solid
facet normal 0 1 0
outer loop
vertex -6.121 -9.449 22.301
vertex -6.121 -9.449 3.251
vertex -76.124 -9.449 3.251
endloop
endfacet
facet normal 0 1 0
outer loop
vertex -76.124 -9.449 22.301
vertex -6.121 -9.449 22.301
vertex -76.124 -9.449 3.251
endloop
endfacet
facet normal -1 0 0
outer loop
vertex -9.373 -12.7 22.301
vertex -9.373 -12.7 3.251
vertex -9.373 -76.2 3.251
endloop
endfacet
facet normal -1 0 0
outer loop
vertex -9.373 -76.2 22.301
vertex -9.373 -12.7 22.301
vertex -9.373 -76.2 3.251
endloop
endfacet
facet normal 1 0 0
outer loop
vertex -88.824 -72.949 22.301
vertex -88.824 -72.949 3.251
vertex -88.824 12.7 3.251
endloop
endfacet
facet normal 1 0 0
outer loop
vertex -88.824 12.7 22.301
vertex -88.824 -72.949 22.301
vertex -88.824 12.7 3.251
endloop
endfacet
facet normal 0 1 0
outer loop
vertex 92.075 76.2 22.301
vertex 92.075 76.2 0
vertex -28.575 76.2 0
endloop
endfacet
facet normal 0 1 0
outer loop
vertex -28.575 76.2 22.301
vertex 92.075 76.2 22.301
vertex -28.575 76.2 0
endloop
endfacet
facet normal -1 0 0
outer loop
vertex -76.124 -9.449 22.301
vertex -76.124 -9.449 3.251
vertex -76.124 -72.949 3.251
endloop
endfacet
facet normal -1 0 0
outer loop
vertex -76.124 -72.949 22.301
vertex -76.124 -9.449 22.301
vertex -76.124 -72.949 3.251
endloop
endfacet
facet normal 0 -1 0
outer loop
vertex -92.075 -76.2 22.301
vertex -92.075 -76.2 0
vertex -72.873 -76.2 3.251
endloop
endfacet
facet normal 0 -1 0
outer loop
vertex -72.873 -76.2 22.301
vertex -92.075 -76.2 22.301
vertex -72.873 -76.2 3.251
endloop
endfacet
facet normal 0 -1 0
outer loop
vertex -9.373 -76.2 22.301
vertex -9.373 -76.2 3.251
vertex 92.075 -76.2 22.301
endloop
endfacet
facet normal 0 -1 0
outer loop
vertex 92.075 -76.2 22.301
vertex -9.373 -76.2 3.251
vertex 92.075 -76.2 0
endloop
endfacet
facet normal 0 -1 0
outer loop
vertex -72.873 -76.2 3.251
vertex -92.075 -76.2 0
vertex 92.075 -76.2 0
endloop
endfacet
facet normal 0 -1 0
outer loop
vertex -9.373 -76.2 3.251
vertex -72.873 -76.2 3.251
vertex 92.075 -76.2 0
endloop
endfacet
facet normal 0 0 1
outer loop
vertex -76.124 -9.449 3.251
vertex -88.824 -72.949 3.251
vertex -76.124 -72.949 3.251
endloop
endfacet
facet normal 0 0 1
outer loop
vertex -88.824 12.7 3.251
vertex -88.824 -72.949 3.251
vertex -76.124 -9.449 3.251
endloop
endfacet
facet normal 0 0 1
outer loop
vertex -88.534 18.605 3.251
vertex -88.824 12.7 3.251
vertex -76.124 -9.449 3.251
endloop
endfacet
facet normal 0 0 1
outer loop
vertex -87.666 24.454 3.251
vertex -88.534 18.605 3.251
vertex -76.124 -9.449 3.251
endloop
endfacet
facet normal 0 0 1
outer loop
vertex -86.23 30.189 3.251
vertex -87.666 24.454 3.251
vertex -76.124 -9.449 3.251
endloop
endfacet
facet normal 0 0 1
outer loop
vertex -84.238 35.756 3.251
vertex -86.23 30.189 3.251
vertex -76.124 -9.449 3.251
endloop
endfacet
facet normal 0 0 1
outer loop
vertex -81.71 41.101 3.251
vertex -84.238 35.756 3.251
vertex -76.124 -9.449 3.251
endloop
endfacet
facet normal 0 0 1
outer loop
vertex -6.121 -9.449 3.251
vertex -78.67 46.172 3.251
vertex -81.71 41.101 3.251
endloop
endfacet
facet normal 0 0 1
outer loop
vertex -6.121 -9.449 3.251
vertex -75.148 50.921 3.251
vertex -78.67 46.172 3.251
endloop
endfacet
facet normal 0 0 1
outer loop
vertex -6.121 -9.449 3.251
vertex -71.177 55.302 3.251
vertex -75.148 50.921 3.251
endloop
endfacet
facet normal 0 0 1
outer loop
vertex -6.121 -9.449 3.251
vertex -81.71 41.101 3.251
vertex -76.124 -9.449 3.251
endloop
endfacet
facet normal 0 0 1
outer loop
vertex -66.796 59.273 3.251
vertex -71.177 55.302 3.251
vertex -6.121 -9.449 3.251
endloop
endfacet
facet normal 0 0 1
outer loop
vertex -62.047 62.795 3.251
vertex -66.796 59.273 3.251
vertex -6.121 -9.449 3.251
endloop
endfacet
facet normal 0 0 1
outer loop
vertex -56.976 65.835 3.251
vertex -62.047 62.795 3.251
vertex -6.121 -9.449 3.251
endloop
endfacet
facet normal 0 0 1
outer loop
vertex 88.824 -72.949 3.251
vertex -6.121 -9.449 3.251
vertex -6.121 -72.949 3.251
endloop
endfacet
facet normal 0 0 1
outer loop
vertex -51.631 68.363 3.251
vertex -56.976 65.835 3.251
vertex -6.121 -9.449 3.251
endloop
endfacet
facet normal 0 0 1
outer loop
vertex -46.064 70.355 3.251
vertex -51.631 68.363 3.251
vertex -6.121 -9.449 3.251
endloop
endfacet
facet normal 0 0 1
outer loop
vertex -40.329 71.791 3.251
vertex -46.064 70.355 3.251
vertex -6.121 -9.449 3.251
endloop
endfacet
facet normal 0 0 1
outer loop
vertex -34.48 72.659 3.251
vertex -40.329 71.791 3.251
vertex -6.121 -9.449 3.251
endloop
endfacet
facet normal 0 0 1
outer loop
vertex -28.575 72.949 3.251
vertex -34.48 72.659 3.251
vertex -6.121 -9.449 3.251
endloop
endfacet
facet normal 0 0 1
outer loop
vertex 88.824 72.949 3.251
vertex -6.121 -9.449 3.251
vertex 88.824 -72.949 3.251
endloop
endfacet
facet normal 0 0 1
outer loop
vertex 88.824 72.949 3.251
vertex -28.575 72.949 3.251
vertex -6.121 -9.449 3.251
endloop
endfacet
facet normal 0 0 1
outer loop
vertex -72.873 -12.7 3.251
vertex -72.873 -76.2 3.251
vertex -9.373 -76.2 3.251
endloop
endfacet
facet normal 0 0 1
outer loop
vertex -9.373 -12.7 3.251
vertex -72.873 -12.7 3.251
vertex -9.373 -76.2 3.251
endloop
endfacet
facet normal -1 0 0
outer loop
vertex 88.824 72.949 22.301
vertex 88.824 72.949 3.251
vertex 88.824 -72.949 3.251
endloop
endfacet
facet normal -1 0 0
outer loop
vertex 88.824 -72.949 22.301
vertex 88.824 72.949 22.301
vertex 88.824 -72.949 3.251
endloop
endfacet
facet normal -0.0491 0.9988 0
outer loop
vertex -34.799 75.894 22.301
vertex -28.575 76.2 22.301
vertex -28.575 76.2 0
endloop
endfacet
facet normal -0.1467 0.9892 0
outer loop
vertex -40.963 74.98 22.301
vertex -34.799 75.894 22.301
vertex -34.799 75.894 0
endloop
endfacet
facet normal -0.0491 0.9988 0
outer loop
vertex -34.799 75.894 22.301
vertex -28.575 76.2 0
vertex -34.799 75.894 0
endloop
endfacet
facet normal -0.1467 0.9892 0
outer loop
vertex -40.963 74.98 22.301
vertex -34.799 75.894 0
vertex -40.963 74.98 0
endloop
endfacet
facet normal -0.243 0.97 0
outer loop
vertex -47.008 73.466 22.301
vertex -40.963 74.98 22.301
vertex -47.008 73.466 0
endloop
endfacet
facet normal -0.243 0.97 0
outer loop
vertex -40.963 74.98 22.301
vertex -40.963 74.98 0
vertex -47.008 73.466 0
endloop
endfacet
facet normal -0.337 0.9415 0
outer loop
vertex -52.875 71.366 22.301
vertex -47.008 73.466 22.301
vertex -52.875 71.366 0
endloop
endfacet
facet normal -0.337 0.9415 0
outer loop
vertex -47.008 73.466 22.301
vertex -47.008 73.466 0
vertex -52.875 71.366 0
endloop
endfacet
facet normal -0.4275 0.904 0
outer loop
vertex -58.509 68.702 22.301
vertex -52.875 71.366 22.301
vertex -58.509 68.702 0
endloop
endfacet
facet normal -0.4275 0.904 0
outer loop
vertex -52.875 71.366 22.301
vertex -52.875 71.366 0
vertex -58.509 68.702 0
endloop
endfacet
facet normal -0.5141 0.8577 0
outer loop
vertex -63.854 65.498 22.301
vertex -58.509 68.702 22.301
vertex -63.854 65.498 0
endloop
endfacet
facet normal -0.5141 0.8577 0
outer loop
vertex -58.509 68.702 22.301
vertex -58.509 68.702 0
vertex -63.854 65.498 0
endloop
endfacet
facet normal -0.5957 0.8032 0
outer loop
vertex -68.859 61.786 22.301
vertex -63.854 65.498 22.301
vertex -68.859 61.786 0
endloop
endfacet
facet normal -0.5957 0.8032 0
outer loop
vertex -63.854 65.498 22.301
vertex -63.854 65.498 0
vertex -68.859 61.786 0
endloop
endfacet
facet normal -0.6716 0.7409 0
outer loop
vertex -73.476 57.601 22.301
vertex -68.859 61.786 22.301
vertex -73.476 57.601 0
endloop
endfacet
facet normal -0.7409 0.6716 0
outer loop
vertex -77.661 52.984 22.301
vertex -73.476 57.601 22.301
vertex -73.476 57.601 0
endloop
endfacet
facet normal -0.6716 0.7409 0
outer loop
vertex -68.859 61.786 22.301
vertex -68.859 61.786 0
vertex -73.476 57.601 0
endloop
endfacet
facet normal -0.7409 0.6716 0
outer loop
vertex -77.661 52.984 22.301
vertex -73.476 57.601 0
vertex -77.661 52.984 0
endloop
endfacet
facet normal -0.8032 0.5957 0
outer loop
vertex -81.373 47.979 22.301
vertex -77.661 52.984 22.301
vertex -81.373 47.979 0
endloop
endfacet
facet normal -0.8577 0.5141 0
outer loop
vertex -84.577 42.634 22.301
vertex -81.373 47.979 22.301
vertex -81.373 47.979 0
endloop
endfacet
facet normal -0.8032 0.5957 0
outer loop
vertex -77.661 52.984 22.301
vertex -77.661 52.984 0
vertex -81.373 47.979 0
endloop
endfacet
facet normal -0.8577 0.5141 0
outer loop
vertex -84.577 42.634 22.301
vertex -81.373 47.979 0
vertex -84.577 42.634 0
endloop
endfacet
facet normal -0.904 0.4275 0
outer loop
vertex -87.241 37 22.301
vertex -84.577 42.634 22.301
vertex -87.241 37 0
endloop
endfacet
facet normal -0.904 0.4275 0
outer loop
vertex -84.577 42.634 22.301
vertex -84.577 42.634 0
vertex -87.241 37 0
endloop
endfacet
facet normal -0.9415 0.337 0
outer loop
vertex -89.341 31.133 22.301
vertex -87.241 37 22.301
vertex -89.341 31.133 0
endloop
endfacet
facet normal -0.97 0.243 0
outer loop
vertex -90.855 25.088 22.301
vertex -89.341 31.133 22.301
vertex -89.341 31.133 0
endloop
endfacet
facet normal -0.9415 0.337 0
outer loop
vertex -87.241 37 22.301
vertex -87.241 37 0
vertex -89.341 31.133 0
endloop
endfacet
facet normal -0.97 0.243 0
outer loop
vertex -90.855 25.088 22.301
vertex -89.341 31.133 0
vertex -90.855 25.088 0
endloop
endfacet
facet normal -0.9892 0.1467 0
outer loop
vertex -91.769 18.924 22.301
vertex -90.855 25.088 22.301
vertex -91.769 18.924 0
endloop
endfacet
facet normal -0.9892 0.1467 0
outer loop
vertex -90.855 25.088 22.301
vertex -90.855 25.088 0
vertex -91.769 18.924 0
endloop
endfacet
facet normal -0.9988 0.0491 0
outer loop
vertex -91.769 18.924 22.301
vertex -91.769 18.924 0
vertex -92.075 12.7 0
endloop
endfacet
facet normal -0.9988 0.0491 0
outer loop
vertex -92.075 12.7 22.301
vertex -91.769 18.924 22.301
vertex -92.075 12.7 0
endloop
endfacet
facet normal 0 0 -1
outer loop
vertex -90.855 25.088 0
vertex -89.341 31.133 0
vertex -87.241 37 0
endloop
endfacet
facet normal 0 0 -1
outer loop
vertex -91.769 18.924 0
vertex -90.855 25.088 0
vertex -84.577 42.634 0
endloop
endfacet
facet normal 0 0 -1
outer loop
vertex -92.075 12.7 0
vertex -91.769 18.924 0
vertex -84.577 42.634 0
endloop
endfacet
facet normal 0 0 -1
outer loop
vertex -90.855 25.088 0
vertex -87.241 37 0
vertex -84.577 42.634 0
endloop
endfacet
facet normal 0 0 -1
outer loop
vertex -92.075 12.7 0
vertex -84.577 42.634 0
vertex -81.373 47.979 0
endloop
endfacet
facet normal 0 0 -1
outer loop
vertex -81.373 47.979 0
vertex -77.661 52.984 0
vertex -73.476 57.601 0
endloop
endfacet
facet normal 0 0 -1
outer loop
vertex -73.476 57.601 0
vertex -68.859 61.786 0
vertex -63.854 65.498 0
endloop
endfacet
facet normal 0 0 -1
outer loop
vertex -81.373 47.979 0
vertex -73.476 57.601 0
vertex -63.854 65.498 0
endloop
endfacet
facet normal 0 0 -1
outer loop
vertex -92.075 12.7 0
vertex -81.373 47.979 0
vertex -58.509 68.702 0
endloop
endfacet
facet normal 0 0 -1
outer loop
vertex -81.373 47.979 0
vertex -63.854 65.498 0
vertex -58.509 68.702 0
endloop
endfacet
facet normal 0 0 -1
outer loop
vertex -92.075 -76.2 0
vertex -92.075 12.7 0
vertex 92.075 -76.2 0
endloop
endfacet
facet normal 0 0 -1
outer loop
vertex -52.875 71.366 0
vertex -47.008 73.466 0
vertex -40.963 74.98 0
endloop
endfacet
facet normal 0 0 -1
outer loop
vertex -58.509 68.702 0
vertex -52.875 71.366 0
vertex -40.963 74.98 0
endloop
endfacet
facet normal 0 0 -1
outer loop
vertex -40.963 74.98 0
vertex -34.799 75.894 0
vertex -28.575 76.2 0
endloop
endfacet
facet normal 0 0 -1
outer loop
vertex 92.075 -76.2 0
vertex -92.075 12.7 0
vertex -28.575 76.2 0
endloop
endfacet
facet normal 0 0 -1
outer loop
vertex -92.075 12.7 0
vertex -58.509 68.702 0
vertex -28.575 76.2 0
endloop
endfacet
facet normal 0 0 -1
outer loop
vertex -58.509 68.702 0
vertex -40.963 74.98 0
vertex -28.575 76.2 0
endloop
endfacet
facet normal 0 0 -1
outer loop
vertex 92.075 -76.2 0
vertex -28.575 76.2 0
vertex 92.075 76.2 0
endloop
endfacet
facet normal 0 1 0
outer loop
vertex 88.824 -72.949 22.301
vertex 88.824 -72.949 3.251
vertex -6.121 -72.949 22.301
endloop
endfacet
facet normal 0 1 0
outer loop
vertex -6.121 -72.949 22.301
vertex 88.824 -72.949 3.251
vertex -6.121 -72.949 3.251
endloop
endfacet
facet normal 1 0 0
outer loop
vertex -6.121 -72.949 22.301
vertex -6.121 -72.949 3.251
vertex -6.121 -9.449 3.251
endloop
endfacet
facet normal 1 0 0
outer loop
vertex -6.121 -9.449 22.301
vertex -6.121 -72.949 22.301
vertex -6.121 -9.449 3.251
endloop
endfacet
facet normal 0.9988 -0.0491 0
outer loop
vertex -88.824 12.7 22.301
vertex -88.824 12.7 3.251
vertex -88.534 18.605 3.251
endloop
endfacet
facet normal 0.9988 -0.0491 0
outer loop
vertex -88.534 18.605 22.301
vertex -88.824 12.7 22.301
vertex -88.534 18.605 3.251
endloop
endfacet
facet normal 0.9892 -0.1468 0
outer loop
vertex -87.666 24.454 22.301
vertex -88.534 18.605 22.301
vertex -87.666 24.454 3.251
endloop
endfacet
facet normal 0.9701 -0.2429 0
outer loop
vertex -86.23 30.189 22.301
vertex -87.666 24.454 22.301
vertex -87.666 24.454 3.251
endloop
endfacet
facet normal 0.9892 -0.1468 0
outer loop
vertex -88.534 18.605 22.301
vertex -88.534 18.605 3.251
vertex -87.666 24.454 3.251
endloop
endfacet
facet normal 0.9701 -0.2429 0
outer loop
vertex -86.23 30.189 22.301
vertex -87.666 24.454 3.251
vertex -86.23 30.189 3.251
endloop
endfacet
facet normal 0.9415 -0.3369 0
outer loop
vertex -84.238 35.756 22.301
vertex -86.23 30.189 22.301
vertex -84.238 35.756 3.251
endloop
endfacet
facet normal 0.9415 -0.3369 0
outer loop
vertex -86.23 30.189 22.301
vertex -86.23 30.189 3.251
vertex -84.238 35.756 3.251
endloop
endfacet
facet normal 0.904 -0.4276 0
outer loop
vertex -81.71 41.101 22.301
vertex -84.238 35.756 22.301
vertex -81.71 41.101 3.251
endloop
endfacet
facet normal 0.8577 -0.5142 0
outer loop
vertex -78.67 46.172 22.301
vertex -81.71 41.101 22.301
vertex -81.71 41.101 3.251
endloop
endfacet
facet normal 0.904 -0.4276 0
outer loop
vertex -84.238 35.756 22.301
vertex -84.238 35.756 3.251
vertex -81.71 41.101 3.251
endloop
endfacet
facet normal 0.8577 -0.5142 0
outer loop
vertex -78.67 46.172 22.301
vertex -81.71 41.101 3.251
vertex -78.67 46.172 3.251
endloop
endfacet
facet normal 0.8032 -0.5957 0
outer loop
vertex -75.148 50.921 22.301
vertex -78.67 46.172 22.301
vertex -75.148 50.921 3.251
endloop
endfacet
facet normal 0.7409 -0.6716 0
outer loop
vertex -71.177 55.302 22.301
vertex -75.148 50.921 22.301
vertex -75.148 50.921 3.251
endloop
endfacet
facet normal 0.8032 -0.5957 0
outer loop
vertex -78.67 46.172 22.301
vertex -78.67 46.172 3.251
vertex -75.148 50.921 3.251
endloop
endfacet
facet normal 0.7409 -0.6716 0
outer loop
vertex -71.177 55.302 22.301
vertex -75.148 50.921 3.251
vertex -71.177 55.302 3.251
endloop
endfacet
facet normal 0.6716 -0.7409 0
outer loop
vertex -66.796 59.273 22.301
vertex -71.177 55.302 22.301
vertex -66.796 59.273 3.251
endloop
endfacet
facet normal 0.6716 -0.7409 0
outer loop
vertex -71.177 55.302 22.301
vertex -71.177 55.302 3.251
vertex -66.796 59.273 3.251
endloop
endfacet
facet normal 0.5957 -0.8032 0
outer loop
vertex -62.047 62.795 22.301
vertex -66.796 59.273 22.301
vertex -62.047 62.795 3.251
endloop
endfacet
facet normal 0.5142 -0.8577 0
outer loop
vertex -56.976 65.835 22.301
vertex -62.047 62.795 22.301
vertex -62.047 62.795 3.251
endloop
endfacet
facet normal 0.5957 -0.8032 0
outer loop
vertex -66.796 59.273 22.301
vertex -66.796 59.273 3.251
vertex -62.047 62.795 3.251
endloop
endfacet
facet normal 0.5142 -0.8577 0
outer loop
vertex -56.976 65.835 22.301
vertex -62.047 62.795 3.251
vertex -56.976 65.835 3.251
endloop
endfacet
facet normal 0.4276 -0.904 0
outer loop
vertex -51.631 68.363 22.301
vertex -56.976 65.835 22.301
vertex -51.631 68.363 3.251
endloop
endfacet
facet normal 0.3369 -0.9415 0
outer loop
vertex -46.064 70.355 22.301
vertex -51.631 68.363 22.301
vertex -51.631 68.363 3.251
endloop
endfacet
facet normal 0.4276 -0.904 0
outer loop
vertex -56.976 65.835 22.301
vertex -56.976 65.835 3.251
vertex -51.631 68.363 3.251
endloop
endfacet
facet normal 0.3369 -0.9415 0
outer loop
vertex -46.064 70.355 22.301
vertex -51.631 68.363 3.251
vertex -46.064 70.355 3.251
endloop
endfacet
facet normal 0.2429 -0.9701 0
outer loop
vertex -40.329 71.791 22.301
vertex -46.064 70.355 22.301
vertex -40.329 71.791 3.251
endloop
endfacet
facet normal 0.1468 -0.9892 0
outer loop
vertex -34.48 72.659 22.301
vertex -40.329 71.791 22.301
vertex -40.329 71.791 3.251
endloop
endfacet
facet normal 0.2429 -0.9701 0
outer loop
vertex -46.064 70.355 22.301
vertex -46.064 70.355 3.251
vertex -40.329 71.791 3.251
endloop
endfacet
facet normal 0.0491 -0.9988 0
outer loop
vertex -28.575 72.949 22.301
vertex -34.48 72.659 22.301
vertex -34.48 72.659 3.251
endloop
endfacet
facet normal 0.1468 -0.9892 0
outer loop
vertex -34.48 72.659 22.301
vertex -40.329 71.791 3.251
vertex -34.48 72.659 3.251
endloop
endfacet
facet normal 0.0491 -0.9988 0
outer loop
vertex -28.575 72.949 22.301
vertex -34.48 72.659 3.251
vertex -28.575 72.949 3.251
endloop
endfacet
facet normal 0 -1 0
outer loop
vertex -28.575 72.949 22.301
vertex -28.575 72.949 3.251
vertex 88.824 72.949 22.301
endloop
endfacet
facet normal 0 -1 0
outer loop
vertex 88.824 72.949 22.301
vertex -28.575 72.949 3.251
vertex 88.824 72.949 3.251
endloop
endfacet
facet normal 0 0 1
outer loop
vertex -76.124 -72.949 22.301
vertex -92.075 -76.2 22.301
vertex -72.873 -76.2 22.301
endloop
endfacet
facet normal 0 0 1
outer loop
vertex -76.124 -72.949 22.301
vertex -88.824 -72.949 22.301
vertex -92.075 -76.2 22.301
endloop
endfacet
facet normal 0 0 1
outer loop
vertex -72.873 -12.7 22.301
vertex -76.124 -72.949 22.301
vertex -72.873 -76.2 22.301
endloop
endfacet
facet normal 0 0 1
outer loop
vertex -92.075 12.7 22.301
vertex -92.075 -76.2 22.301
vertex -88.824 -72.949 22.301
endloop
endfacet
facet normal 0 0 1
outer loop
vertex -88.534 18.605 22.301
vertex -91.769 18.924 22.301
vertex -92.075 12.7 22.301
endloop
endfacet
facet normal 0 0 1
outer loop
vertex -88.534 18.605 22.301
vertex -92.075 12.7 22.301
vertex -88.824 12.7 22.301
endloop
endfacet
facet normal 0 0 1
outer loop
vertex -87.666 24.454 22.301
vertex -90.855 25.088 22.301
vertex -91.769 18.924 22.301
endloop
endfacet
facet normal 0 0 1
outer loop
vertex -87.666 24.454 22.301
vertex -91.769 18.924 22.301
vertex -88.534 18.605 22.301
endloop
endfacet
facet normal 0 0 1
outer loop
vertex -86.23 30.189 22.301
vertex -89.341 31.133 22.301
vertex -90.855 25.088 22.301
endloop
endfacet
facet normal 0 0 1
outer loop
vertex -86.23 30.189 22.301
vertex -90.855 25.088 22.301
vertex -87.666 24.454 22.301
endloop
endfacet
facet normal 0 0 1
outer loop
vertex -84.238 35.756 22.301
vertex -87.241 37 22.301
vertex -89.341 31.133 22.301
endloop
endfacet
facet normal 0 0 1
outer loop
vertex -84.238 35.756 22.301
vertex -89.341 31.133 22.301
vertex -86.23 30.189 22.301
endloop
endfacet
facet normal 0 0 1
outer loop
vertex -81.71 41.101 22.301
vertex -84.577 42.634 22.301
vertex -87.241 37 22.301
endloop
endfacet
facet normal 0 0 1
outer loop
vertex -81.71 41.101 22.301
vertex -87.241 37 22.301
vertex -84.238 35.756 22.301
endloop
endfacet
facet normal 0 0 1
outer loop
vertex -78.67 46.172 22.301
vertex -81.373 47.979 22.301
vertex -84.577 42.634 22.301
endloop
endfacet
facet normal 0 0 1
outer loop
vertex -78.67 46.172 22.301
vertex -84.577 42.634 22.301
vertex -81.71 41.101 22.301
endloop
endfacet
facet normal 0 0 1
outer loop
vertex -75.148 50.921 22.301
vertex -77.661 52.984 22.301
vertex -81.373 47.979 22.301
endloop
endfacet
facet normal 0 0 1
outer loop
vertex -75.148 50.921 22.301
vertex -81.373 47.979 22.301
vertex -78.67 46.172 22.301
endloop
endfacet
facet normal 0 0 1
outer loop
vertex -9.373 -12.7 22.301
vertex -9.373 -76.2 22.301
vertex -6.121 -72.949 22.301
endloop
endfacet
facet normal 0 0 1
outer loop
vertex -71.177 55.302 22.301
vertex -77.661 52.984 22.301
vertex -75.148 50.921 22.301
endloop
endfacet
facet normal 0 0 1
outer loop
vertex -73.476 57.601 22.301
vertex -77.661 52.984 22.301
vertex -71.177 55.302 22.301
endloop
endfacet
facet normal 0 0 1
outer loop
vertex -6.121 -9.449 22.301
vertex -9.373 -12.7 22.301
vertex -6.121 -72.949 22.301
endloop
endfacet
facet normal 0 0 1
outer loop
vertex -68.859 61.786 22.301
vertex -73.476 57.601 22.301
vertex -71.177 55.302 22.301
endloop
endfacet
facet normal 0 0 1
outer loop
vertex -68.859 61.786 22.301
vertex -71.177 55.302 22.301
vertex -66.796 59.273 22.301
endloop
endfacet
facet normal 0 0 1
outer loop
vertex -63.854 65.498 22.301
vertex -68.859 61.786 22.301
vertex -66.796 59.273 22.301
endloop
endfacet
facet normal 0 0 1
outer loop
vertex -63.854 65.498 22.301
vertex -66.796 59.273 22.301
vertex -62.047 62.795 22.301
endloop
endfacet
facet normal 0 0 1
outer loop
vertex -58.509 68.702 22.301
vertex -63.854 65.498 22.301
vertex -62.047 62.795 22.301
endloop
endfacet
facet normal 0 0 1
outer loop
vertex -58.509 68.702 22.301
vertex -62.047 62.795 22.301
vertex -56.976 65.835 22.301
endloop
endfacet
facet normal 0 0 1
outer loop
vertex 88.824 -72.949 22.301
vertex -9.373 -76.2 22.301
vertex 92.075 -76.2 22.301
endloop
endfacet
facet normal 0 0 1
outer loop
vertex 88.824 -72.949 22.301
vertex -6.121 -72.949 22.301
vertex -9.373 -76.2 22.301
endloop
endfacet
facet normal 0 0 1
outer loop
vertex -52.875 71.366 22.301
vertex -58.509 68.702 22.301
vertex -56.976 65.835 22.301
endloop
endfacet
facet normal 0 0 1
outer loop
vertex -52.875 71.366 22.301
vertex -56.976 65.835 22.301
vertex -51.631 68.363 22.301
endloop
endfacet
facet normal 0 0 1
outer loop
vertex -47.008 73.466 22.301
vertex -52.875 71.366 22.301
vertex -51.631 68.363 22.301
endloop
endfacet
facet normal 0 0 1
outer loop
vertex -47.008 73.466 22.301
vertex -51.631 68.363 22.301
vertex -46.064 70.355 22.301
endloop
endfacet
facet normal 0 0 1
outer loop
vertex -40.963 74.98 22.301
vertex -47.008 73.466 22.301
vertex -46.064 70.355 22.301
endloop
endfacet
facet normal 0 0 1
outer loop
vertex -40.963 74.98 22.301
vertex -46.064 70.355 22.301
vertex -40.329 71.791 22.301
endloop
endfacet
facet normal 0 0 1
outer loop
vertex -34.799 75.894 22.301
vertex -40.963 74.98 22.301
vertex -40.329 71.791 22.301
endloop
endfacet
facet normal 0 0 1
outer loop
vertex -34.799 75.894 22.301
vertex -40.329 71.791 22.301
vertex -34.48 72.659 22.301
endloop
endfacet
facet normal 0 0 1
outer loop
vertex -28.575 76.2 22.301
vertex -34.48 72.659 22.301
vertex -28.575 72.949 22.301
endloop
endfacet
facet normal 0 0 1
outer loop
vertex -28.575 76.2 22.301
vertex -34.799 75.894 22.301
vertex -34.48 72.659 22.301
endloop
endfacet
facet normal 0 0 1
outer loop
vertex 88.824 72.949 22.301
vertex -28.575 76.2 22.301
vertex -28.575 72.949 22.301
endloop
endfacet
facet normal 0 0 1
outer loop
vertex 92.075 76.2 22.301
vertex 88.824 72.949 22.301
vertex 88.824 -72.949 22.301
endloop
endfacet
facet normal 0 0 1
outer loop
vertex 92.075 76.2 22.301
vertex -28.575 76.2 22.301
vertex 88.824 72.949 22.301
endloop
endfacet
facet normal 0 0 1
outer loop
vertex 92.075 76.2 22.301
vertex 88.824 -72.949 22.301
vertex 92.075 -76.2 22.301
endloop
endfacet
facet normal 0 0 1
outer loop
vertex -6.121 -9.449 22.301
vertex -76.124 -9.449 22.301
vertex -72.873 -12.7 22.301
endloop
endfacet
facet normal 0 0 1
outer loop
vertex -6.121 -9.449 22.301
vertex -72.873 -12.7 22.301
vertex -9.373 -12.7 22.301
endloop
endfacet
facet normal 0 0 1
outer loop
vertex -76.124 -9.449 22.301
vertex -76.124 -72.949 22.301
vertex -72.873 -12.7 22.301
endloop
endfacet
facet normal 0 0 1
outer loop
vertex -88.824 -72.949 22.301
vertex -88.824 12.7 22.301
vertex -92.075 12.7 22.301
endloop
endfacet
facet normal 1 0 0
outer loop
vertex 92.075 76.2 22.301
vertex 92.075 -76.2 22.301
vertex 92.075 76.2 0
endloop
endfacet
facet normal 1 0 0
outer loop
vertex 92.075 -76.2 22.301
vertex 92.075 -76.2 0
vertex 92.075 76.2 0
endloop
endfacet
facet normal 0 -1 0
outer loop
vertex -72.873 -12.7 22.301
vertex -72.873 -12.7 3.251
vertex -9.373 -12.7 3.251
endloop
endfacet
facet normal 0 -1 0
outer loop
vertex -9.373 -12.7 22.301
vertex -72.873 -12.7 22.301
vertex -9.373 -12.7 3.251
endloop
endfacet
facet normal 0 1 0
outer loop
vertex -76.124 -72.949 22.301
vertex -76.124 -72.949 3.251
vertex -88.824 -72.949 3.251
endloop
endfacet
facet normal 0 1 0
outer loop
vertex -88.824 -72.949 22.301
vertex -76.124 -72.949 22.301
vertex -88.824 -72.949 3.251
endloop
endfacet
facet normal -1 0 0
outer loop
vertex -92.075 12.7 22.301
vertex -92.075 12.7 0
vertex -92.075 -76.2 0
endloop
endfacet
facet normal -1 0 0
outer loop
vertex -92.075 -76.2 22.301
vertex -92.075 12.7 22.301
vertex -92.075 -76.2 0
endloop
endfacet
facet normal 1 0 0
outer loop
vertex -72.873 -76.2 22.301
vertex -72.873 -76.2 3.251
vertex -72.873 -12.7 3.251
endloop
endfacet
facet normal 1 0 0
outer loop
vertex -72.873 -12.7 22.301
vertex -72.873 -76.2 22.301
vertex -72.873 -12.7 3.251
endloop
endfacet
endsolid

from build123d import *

# Parameters (mm, degrees)
F1_DEPTH = 3.2512
F3_DEPTH = 19.05


with BuildPart() as f1:
    # F0 (on Top) → F1 (new body)
    with BuildSketch(Plane.XY):
        with BuildLine():
            Line((92.075, 76.2), (-28.575, 76.2))
            ThreePointArc((-28.575, 76.2), (-73.476281, 57.601281), (-92.075, 12.7))
            Line((-92.075, 12.7), (-92.075, -76.2))
            Line((-92.075, -76.2), (92.075, -76.2))
            Line((92.075, -76.2), (92.075, 76.2))
        make_face()
    extrude(amount=F1_DEPTH)

    # F2 (on face) → F3 (join)
    with BuildSketch(Plane.XY.offset(3.2512)):
        with BuildLine():
            Line((-72.8726, -76.2), (-72.8726, -12.7))
            Line((-72.8726, -12.7), (-9.3726, -12.7))
            Line((-9.3726, -12.7), (-9.3726, -76.2))
            Line((-9.3726, -76.2), (92.075, -76.2))
            Line((92.075, -76.2), (92.075, 76.2))
            Line((92.075, 76.2), (-28.575, 76.2))
            ThreePointArc((-28.575, 76.2), (-73.476281, 57.601281), (-92.075, 12.7))
            Line((-92.075, 12.7), (-92.075, -76.2))
            Line((-92.075, -76.2), (-72.8726, -76.2))
        make_face()
        with BuildLine():
            Line((-28.575, 72.9488), (88.8238, 72.9488))
            Line((88.8238, 72.9488), (88.8238, -72.9488))
            Line((88.8238, -72.9488), (-6.1214, -72.9488))
            Line((-6.1214, -72.9488), (-6.1214, -9.4488))
            Line((-6.1214, -9.4488), (-76.1238, -9.4488))
            Line((-76.1238, -9.4488), (-76.1238, -72.9488))
            Line((-76.1238, -72.9488), (-88.8238, -72.9488))
            Line((-88.8238, -72.9488), (-88.8238, 12.7))
            ThreePointArc((-88.8238, 12.7), (-71.177335, 55.302335), (-28.575, 72.9488))
        make_face(mode=Mode.SUBTRACT)
    extrude(amount=F3_DEPTH)


solid = f1.part
